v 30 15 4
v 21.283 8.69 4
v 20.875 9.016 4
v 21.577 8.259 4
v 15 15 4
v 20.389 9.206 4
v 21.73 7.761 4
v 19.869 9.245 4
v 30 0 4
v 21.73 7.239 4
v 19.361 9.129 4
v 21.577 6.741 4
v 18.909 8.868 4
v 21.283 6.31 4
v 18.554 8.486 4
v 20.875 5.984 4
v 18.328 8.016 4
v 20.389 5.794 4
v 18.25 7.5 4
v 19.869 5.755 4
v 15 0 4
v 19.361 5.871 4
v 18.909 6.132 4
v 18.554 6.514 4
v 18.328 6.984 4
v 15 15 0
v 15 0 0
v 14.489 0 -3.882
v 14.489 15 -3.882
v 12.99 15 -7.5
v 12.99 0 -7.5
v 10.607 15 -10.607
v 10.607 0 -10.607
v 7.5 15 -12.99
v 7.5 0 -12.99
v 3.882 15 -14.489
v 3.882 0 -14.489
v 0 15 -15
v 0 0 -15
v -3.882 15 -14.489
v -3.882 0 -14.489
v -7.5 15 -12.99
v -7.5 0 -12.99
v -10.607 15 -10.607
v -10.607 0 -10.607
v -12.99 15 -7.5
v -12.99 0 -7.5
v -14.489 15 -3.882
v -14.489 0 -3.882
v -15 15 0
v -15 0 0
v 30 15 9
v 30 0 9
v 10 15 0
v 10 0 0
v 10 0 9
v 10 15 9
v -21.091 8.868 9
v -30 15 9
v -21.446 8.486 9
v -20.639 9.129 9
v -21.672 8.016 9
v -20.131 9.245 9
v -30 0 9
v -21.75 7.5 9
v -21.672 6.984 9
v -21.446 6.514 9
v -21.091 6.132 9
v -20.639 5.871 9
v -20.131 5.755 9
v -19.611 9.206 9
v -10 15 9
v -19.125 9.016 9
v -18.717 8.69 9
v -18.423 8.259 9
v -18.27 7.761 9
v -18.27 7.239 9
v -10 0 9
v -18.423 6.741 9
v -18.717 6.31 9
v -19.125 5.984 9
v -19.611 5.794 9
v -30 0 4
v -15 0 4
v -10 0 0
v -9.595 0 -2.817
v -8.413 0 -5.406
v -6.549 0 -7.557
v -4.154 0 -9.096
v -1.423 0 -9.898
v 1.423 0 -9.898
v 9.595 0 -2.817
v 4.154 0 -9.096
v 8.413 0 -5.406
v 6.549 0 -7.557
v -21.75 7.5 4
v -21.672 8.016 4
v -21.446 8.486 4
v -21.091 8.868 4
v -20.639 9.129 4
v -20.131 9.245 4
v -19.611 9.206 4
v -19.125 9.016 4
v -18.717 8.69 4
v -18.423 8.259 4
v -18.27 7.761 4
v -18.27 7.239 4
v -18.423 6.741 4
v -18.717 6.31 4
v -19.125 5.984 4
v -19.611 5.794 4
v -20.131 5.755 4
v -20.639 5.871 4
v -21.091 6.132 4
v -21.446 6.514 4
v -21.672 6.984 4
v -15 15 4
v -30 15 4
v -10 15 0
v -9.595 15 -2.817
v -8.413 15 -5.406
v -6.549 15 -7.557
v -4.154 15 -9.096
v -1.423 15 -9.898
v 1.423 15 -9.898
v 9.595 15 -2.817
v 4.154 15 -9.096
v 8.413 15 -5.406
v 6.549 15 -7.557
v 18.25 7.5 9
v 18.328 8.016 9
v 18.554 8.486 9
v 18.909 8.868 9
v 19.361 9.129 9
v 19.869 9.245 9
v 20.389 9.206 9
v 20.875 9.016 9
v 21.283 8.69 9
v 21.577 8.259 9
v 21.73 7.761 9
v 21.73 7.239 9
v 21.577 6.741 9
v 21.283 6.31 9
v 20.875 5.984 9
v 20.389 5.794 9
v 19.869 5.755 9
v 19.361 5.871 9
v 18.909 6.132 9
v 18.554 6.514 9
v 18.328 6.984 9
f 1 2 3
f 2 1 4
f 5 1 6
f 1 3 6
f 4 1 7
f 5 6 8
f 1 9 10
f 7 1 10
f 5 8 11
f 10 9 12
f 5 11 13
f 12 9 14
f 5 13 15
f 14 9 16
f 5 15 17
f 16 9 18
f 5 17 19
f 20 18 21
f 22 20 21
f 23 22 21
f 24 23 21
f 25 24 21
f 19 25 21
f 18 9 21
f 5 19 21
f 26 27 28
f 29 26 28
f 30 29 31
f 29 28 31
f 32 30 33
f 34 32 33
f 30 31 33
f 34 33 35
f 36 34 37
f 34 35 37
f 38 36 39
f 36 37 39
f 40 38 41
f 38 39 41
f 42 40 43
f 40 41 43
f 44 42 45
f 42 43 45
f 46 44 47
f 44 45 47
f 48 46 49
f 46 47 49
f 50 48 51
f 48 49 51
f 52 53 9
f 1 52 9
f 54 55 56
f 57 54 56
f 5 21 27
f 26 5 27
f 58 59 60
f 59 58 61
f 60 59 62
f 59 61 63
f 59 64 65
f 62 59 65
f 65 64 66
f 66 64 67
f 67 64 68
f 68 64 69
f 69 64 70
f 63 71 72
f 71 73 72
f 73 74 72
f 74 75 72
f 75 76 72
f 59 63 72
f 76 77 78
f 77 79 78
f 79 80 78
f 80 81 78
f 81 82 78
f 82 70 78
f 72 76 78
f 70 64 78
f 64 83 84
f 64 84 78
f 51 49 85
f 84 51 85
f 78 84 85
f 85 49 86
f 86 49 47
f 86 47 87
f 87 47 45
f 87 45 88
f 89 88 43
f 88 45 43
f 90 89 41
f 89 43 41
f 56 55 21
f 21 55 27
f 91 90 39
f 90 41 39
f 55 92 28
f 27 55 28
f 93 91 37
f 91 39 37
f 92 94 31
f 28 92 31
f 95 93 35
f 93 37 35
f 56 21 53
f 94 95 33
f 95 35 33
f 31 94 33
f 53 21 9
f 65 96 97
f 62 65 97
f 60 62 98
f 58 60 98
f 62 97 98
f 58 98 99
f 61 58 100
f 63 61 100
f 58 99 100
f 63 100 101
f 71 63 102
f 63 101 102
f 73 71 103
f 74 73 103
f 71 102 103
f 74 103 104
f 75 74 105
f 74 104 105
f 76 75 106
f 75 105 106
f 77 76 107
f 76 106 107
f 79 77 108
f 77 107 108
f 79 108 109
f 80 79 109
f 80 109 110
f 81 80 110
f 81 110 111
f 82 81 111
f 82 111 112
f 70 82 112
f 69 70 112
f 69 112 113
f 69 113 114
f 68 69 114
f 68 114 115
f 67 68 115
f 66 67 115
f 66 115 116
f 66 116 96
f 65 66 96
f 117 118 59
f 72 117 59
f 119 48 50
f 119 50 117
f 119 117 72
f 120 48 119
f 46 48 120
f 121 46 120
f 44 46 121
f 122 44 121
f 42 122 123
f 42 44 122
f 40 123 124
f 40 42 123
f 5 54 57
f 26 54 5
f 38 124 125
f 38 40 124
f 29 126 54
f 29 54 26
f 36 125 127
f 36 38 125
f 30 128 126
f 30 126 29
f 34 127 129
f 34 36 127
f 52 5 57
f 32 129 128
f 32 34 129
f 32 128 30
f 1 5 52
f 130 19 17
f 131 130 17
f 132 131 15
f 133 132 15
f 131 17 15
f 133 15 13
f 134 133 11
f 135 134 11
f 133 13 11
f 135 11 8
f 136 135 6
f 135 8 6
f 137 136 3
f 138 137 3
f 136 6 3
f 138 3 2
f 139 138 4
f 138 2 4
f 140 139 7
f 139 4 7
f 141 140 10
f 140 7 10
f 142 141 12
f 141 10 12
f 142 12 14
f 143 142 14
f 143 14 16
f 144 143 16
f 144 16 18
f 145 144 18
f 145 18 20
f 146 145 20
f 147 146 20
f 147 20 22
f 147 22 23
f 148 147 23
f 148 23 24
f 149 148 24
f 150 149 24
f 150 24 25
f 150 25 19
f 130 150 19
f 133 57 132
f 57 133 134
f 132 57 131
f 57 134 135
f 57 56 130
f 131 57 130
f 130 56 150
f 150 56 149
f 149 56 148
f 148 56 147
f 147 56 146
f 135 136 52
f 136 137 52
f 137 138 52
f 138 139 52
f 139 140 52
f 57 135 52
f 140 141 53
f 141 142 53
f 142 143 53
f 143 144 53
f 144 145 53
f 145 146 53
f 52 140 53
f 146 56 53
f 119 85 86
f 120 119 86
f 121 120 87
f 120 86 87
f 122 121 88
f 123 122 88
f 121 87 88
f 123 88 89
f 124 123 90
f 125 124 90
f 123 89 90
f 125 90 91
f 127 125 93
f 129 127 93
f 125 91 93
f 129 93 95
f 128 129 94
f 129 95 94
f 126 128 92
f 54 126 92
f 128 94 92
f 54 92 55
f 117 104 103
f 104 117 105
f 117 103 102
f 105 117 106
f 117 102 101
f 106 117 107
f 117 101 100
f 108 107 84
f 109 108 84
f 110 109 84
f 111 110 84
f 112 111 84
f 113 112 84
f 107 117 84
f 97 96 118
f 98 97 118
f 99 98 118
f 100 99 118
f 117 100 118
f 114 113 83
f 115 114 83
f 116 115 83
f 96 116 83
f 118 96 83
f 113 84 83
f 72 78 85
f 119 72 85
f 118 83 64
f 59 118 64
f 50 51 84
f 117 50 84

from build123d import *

# Parameters (mm, degrees)
BOSS_EXTRUDE1_DEPTH = 15
SKETCH2_R           = 1.75
CUT_EXTRUDE1_DEPTH  = 6


with BuildPart() as part:
    # Sketch1 → Boss-Extrude1 (new body)
    with BuildSketch(Plane(origin=(0, 0, 0), x_dir=(1, 0, 0), z_dir=(0, 1, 0))):
        with BuildLine():
            Line((-30, -4), (-30, -9))
            Line((-30, -9), (-10, -9))
            Line((-10, -9), (-10, 0))
            ThreePointArc((-10, 0), (0, 10), (10, 0))
            Line((10, 0), (10, -9))
            Line((10, -9), (30, -9))
            Line((30, -9), (30, -4))
            Line((30, -4), (15, -4))
            Line((15, -4), (15, 0))
            ThreePointArc((15, 0), (0, 15), (-15, 0))
            Line((-15, 0), (-15, -4))
            Line((-15, -4), (-30, -4))
        make_face()
    extrude(amount=BOSS_EXTRUDE1_DEPTH)

    # Sketch2 → Cut-Extrude1 (cut, through all)
    with BuildSketch(Plane(origin=(0, 0, 4), x_dir=(-1, 0, 0), z_dir=(0, 0, -1))):
        with Locations((-20, 7.5)):
            Circle(SKETCH2_R)
        with Locations((20, 7.5)):
            Circle(SKETCH2_R)
    extrude(amount=-CUT_EXTRUDE1_DEPTH, mode=Mode.SUBTRACT)


solid = part.part
